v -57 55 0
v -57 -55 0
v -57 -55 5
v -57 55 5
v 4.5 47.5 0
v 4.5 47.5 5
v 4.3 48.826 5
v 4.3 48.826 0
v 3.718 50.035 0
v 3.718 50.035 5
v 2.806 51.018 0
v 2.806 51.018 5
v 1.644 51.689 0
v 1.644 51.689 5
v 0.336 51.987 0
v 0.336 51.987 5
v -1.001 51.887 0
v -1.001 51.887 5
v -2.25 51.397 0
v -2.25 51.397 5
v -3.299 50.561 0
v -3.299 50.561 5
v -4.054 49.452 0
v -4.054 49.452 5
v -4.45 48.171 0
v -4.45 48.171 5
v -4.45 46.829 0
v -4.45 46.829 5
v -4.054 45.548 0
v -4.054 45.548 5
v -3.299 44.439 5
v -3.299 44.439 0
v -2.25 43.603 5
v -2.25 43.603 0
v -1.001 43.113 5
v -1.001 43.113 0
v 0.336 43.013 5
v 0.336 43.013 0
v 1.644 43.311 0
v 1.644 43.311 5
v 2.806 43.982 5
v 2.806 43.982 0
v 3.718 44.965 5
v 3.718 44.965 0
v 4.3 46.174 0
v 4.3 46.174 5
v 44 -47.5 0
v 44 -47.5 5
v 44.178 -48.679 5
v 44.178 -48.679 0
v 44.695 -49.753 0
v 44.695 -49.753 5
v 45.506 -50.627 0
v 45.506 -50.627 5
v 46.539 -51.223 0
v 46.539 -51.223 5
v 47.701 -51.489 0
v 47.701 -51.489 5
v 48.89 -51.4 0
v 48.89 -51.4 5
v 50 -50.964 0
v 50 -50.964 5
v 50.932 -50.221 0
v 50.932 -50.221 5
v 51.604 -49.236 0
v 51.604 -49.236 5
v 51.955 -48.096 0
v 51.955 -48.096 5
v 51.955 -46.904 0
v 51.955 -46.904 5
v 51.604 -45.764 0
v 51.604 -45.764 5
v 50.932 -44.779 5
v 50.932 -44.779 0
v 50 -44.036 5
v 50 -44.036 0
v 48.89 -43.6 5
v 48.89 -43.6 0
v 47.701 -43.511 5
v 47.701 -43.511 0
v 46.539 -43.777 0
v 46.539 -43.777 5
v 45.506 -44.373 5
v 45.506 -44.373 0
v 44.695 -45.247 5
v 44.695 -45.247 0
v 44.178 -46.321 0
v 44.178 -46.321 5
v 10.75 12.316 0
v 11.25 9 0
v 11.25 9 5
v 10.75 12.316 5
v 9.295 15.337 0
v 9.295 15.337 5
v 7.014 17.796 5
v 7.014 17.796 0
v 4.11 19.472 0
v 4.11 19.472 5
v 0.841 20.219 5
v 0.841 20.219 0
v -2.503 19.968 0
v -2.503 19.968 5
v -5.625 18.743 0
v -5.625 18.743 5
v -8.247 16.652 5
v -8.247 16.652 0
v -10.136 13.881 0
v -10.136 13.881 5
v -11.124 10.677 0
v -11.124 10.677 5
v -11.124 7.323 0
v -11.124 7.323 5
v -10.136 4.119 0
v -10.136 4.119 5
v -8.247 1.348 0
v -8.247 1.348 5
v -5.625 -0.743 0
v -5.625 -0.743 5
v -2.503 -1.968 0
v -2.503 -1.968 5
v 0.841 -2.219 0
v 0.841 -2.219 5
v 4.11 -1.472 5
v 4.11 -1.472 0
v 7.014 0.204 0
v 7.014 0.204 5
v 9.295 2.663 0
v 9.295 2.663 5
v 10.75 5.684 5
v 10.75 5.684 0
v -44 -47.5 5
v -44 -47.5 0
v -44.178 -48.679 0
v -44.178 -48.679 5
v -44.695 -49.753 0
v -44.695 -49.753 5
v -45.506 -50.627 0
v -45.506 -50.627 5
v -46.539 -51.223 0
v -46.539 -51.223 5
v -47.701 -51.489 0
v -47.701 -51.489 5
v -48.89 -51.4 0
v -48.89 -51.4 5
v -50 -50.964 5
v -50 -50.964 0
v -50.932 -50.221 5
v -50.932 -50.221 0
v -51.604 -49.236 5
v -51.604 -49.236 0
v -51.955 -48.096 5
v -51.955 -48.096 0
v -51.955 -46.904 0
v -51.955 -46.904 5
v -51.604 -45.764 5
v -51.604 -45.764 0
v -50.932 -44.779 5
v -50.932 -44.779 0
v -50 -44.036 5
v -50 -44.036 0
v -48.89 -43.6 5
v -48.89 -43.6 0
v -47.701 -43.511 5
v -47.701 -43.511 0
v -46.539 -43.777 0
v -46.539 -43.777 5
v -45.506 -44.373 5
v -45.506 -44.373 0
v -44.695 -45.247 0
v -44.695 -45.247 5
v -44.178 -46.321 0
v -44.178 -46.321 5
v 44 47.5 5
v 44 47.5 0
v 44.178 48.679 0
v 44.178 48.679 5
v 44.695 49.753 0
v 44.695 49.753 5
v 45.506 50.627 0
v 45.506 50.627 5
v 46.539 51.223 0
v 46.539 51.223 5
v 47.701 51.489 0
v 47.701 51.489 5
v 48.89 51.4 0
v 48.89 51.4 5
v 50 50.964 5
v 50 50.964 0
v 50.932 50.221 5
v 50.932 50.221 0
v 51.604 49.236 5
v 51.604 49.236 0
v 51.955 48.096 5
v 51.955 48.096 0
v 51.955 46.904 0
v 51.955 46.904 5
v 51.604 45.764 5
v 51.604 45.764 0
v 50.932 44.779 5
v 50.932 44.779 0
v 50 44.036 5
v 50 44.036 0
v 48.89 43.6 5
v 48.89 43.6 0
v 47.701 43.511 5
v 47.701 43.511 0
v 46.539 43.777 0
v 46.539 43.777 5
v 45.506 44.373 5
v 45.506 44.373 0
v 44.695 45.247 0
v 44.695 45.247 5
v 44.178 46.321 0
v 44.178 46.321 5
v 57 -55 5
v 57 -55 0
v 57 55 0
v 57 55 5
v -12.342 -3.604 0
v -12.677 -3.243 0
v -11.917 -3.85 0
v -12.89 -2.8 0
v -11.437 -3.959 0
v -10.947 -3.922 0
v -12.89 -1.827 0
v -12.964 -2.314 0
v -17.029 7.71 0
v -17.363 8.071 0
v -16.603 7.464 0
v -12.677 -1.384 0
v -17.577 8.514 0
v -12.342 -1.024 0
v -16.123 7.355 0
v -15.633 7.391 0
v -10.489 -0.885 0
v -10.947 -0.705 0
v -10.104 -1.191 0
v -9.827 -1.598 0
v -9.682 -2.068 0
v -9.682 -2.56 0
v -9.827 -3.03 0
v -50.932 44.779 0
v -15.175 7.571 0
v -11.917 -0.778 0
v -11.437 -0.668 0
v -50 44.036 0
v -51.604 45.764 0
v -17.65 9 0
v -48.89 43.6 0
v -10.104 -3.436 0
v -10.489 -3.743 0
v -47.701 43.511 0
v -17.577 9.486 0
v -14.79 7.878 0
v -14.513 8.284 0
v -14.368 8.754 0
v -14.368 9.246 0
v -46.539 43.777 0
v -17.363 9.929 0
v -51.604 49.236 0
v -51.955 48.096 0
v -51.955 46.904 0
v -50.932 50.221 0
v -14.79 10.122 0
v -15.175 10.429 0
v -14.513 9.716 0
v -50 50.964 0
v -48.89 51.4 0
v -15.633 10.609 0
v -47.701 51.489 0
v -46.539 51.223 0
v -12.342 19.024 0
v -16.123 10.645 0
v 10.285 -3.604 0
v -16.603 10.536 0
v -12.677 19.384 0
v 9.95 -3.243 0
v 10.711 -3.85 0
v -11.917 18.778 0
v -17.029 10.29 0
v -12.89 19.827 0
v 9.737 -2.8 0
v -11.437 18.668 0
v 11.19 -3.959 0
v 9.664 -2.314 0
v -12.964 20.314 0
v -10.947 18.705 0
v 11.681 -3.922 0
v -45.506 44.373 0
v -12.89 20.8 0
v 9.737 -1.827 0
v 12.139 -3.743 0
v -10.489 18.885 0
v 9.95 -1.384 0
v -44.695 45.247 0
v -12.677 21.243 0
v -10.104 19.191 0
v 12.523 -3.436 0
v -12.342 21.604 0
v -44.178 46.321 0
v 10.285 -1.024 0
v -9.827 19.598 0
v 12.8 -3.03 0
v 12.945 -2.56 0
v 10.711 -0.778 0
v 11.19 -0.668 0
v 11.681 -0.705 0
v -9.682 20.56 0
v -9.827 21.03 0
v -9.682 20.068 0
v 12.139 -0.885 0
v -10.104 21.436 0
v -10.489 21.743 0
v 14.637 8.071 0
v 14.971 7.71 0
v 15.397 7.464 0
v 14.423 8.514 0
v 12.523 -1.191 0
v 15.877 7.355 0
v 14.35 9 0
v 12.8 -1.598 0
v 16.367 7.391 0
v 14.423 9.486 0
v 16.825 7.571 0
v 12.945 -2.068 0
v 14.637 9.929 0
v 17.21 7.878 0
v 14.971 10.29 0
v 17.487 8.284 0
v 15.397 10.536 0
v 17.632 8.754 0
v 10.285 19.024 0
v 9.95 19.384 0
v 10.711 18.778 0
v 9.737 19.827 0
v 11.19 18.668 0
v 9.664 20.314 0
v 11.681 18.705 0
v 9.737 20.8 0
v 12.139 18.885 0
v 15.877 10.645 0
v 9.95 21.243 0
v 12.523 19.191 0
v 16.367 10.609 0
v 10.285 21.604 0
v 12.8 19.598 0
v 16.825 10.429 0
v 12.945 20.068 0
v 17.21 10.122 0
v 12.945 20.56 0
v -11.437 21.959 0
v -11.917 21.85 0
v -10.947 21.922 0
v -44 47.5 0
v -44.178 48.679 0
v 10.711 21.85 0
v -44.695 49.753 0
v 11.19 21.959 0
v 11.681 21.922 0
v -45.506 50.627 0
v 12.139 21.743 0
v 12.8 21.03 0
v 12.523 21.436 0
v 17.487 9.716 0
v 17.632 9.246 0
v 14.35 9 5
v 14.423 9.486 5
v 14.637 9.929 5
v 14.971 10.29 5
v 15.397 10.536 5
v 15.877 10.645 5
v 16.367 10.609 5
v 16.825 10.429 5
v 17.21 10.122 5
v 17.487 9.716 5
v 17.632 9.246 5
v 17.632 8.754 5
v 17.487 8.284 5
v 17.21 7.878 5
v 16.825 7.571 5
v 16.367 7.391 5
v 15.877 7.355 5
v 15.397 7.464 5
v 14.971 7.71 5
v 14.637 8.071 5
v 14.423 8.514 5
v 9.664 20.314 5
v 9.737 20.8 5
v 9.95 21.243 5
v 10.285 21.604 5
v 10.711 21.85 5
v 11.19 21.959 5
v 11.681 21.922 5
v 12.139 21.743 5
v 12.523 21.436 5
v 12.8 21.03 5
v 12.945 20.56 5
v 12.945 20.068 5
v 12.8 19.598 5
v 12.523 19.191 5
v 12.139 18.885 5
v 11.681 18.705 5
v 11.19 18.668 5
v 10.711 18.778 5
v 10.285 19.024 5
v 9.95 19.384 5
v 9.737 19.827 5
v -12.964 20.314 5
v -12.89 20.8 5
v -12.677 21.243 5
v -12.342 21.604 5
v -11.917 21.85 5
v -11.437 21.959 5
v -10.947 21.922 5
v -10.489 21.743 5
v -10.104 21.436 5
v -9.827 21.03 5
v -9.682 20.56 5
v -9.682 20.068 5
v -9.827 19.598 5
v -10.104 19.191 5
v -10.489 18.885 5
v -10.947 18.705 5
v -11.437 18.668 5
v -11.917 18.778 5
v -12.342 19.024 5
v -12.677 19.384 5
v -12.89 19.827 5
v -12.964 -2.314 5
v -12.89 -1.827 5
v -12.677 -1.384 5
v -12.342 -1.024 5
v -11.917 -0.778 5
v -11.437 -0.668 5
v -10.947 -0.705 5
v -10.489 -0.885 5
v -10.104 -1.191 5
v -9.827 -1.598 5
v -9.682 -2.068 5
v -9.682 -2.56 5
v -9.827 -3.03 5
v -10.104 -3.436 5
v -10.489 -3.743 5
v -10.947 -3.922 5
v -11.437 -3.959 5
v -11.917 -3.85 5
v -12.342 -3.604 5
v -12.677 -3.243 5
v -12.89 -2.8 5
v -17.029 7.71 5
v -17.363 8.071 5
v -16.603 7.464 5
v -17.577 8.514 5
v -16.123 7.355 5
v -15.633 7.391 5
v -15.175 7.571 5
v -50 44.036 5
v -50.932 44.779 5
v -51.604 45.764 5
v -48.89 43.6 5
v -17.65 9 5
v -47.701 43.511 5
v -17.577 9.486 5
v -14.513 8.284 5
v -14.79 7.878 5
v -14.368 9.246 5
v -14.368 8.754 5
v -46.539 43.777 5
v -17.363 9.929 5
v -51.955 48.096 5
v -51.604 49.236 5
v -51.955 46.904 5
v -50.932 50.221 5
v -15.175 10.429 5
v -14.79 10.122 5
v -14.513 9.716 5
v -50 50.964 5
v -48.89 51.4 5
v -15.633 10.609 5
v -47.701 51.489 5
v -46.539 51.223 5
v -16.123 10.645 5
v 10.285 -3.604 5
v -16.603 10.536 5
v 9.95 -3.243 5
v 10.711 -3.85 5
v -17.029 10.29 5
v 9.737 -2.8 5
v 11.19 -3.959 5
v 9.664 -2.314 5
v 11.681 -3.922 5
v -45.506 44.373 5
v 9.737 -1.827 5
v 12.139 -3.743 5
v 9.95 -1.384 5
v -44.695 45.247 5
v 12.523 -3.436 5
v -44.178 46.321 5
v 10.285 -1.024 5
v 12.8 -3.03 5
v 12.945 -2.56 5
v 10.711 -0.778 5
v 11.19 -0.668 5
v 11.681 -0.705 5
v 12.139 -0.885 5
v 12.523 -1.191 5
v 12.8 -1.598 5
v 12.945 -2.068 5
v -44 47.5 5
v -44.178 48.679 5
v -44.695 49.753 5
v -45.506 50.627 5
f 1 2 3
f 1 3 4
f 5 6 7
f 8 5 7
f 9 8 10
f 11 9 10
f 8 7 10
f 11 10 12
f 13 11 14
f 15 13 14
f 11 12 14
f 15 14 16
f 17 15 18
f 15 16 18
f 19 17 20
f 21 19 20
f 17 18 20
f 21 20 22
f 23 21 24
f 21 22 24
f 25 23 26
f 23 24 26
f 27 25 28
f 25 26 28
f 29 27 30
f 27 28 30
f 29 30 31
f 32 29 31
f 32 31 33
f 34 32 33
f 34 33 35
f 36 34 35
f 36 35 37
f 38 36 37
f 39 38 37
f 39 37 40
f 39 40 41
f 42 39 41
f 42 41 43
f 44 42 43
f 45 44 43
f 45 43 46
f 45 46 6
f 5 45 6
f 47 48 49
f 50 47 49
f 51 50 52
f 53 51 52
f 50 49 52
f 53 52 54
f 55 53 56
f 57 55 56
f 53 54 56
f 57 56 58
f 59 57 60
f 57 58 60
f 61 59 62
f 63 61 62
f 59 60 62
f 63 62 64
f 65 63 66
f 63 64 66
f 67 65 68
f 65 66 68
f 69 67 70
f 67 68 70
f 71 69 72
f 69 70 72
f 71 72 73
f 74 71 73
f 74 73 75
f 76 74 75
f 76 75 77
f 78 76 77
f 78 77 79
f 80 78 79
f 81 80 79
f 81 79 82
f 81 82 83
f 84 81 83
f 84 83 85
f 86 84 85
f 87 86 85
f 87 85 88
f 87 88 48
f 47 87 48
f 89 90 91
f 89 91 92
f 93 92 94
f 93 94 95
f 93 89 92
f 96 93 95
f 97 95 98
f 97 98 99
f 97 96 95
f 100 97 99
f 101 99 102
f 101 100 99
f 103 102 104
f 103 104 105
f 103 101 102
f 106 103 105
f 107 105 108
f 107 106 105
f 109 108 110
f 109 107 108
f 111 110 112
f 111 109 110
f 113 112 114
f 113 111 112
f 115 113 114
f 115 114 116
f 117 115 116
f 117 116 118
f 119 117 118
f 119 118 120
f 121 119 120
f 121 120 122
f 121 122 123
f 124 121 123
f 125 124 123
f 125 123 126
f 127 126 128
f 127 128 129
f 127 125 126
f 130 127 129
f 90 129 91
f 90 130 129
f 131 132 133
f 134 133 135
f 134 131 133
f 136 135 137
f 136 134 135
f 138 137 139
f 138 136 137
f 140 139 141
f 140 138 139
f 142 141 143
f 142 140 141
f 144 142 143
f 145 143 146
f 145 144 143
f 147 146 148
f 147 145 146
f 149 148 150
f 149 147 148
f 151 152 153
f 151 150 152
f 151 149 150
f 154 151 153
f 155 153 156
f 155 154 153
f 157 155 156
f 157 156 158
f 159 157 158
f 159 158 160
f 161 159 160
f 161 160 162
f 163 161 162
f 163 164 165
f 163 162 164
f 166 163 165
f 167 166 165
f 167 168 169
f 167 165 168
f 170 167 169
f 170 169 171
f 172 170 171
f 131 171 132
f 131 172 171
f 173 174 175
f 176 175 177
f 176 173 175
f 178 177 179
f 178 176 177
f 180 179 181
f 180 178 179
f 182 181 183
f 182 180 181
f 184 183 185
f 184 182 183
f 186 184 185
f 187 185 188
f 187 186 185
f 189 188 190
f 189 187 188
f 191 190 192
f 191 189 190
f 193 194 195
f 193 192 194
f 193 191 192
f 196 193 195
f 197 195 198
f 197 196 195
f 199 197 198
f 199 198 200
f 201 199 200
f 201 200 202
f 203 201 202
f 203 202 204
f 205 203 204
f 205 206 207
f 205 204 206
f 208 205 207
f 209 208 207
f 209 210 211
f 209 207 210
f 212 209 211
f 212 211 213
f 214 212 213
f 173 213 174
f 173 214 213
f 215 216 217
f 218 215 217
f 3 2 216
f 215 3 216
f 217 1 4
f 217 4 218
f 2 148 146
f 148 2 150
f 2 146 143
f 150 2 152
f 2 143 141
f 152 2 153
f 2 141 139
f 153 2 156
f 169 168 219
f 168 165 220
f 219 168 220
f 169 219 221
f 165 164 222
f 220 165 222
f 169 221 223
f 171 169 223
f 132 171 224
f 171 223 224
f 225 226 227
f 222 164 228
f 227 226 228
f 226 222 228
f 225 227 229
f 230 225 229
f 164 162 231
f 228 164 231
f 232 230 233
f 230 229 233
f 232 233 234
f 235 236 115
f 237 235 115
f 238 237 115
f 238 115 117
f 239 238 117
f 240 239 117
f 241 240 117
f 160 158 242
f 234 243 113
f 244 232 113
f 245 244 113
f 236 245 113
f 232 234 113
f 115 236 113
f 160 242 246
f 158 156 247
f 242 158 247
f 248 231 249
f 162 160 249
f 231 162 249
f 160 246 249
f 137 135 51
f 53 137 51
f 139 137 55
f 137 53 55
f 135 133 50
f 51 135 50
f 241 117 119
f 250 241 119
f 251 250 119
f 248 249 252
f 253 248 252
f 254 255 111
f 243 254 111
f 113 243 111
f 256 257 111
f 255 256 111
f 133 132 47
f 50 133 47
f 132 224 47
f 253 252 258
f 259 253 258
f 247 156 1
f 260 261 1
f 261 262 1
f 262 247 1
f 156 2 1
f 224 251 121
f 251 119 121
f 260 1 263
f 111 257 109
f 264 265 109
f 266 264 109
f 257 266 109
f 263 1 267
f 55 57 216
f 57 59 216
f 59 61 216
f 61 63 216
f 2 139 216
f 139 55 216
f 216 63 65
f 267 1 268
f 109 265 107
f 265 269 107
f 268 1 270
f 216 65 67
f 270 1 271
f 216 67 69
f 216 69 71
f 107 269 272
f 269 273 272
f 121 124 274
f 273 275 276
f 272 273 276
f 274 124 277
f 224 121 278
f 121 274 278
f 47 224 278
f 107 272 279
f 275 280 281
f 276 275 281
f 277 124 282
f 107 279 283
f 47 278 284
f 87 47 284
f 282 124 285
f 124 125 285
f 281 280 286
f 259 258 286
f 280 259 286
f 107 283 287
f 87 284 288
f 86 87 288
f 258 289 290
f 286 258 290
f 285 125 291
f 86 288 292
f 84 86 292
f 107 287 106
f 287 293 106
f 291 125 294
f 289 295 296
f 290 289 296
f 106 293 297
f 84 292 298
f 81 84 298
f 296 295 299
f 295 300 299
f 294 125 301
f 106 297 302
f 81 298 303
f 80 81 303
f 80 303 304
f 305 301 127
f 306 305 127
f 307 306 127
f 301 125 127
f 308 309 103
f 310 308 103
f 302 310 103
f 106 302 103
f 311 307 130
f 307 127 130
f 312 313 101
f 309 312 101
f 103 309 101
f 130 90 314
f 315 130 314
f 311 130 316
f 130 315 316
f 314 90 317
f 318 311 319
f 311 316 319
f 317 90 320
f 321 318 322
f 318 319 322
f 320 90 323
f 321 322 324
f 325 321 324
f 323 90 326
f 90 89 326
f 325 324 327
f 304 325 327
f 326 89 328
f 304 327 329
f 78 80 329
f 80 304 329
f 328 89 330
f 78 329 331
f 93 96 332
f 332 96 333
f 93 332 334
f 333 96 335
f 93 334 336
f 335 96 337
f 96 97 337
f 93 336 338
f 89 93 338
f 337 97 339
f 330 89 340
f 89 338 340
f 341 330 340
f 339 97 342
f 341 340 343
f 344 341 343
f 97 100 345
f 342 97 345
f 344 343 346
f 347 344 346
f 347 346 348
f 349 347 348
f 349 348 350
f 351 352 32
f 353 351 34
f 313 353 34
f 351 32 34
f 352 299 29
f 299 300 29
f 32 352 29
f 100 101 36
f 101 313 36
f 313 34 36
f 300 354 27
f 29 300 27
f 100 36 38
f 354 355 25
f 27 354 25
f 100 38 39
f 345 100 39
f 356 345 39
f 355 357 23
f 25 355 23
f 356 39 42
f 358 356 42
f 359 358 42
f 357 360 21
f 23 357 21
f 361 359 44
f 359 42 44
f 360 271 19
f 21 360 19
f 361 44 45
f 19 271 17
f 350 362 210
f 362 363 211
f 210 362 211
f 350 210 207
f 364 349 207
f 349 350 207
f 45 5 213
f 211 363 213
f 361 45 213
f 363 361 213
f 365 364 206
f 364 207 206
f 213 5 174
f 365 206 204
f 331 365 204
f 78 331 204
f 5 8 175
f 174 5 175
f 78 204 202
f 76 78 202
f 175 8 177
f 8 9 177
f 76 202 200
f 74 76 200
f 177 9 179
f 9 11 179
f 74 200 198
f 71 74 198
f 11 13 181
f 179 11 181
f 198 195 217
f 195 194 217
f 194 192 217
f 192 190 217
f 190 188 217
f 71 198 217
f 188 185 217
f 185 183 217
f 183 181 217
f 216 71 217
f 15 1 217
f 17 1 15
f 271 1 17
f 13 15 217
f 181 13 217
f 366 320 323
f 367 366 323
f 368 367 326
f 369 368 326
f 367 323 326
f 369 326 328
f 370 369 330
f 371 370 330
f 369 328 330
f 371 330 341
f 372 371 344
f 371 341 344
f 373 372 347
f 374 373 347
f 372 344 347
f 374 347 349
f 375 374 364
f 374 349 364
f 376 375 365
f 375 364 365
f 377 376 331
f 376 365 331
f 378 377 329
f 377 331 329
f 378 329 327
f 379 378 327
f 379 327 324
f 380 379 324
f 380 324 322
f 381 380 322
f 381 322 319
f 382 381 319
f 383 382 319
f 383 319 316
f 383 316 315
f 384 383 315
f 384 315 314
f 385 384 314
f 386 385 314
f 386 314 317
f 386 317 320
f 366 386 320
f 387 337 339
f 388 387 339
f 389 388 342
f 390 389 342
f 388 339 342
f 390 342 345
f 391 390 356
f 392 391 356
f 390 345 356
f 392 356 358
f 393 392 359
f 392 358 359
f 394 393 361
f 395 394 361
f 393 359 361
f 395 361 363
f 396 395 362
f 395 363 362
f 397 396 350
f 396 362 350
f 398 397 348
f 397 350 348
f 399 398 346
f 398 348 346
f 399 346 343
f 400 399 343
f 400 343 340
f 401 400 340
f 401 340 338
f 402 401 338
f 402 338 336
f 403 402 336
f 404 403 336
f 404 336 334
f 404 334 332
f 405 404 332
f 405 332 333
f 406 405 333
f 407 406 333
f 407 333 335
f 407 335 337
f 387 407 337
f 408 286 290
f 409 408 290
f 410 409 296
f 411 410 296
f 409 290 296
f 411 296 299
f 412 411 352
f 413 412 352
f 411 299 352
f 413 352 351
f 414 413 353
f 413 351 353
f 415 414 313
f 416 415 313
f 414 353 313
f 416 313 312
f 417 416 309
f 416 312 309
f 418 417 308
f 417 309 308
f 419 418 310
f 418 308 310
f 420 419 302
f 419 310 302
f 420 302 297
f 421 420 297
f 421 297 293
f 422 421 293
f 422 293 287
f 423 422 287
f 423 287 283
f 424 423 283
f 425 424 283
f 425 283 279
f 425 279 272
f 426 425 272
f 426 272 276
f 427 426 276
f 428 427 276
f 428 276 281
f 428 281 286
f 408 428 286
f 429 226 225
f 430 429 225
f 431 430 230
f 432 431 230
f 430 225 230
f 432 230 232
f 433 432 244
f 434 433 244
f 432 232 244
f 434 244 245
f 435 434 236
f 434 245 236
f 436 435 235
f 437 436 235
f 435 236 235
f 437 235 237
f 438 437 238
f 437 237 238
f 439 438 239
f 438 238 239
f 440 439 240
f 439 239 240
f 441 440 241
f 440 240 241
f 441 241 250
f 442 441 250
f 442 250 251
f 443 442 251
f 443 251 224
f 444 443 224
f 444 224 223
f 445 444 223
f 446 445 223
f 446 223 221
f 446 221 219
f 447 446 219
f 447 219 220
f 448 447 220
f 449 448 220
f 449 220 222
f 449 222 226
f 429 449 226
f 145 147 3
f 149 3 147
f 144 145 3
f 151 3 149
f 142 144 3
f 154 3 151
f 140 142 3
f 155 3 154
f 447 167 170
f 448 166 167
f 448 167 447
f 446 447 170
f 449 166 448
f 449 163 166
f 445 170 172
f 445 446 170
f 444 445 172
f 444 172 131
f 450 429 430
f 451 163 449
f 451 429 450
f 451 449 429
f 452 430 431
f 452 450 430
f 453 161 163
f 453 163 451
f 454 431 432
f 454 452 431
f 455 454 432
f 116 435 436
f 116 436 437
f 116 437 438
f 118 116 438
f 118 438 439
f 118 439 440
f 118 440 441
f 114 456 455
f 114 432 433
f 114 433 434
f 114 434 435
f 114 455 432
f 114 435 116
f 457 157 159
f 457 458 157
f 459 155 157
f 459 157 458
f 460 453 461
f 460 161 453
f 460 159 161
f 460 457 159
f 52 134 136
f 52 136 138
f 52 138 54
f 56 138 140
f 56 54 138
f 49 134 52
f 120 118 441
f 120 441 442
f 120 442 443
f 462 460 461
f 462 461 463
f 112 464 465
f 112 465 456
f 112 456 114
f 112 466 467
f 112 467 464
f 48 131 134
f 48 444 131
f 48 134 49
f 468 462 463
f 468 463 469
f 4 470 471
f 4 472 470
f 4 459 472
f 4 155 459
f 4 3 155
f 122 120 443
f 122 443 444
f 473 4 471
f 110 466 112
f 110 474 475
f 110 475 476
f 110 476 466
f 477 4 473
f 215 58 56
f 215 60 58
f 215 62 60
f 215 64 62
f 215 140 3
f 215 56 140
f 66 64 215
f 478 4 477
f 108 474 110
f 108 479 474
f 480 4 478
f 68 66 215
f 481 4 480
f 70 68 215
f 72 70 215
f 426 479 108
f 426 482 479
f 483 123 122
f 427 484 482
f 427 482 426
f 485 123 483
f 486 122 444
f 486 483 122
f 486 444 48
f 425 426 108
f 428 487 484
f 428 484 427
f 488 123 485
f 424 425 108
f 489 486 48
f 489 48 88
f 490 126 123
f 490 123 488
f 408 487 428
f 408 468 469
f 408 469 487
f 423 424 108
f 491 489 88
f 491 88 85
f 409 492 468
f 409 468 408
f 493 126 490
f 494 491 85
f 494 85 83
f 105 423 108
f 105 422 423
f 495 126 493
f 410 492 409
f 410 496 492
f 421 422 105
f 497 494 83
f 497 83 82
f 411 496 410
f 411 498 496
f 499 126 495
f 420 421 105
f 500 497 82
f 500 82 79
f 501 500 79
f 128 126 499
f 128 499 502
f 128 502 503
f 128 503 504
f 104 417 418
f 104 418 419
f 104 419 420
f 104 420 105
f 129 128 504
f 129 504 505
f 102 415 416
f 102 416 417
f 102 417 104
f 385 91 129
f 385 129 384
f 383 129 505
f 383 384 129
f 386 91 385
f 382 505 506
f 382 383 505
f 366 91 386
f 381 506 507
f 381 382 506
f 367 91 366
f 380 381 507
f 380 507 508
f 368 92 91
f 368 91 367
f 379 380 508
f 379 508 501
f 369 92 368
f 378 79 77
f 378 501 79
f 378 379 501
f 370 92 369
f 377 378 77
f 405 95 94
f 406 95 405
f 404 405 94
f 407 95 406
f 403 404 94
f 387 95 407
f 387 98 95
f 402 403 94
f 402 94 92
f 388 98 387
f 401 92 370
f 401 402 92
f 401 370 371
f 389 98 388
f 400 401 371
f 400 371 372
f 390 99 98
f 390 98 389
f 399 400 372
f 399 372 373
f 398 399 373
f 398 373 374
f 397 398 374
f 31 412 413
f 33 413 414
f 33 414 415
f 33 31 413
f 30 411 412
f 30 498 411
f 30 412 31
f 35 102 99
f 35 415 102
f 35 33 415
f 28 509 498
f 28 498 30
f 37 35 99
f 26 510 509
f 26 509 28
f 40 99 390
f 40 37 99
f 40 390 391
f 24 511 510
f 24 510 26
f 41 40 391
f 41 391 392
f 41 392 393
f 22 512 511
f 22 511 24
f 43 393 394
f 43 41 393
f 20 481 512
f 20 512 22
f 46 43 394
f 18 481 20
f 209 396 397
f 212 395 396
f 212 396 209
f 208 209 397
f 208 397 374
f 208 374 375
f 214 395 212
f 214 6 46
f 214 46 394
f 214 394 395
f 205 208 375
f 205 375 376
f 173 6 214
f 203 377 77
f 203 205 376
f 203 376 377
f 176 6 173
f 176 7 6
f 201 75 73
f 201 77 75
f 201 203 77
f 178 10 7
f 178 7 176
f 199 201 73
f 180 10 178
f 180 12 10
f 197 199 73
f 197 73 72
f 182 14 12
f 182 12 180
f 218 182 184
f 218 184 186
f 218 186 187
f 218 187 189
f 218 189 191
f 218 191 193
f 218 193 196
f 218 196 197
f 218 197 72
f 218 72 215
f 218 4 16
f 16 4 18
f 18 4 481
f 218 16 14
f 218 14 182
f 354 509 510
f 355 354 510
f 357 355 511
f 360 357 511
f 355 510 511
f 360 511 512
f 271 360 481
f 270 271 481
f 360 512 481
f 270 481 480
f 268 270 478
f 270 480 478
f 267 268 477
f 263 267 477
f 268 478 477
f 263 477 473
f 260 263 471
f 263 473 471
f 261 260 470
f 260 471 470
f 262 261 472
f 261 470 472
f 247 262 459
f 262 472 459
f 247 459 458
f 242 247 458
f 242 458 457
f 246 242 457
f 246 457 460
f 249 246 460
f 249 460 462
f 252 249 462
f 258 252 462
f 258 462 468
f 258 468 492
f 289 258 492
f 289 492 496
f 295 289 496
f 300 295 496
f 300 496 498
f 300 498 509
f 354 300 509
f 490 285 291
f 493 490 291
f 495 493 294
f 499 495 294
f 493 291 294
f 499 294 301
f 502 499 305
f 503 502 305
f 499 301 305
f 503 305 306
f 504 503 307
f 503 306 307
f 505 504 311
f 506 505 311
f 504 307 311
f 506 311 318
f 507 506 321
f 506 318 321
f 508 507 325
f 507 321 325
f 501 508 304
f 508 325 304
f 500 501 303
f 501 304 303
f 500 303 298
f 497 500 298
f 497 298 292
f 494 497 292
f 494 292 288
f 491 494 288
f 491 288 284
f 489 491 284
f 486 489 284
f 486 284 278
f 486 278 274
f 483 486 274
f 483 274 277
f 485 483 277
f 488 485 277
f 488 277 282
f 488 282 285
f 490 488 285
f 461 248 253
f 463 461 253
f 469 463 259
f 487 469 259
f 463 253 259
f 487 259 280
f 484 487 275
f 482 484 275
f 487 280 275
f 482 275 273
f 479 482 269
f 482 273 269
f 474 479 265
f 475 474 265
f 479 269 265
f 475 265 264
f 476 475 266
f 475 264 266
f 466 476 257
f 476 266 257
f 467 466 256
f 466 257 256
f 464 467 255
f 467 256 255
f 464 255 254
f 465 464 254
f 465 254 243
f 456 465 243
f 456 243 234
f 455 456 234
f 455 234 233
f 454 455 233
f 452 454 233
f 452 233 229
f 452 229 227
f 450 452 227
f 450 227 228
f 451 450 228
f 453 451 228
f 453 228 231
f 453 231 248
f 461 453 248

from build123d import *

# Parameters (mm, degrees)
SKETCH_1_W               = 114
SKETCH_1_H               = 110
SKETCH_1_R               = 11.25
EXTRUDE_1_DEPTH          = 5
SKETCH_2_R               = 4
CUT_EXTRUDE_1_DEPTH      = 80.366239674
MIRROR_2_COPY_1_SKETCH_R = 4
MIRROR_2_COPY_1_DEPTH    = 80.366239674
HOLE_WIZARD_M4_2_D       = 3.3
HOLE_WIZARD_M4_3_D       = 3.3
HOLE_WIZARD_M4_4_D       = 3.3
SKETCH_3_R               = 4.5
CUT_EXTRUDE_2_DEPTH      = 80.366239674


with BuildPart() as part:
    # 草图1 → 凸台-拉伸1 (new body)
    with BuildSketch(Plane.XY):
        Rectangle(SKETCH_1_W, SKETCH_1_H)
        with Locations((0, 9)):
            Circle(SKETCH_1_R, mode=Mode.SUBTRACT)
    extrude(amount=EXTRUDE_1_DEPTH)

    # 草图2 → 切除-拉伸1 (cut, through all)
    with BuildSketch(Plane.XY.offset(5)):
        with Locations((-48, 47.5)):
            Circle(SKETCH_2_R)
    cut_extrude_1 = extrude(amount=-CUT_EXTRUDE_1_DEPTH, mode=Mode.SUBTRACT)

    # 镜向1: 切除-拉伸1 across plane
    add(cut_extrude_1.mirror(Plane.ZX), mode=Mode.SUBTRACT)

    # 镜向2: 切除-拉伸1 across plane
    add(cut_extrude_1.mirror(Plane(origin=(0, 0, 0), x_dir=(0, 0, 1), z_dir=(1, 0, 0))), mode=Mode.SUBTRACT)

    # 镜向2 copy 1 sketch → 镜向2 copy 1 (cut, through all)
    with BuildSketch(Plane(origin=(0, 0, 5), x_dir=(-1, 0, 0), z_dir=(0, 0, 1))):
        with Locations((-48, 47.5)):
            Circle(MIRROR_2_COPY_1_SKETCH_R)
    extrude(amount=-MIRROR_2_COPY_1_DEPTH, mode=Mode.SUBTRACT)

    # M4 螺纹孔的螺纹孔钻头2 (through all)
    with Locations(Plane(origin=(-16, 9, 5), x_dir=(1, 0, 0), z_dir=(0, 0, 1))):
        with Locations((0, 0)):
            Hole(HOLE_WIZARD_M4_2_D / 2)

    # M4 螺纹孔的螺纹孔钻头3 (through all)
    with Locations(Plane(origin=(-11.313708499, 20.313708499, 5), x_dir=(1, 0, 0), z_dir=(0, 0, 1))):
        with Locations((0, 0), (0, -22.627416998)):
            Hole(HOLE_WIZARD_M4_3_D / 2)

    # M4 螺纹孔的螺纹孔钻头4 (through all)
    with Locations(Plane(origin=(11.313708499, 20.313708499, 5), x_dir=(1, 0, 0), z_dir=(0, 0, 1))):
        with Locations((0, 0), (4.686291501, -11.313708499), (0, -22.627416998)):
            Hole(HOLE_WIZARD_M4_4_D / 2)

    # 草图3 → 切除-拉伸2 (cut, through all)
    with BuildSketch(Plane.XY.offset(5)):
        with Locations((0, 47.5)):
            Circle(SKETCH_3_R)
    extrude(amount=-CUT_EXTRUDE_2_DEPTH, mode=Mode.SUBTRACT)


solid = part.part
